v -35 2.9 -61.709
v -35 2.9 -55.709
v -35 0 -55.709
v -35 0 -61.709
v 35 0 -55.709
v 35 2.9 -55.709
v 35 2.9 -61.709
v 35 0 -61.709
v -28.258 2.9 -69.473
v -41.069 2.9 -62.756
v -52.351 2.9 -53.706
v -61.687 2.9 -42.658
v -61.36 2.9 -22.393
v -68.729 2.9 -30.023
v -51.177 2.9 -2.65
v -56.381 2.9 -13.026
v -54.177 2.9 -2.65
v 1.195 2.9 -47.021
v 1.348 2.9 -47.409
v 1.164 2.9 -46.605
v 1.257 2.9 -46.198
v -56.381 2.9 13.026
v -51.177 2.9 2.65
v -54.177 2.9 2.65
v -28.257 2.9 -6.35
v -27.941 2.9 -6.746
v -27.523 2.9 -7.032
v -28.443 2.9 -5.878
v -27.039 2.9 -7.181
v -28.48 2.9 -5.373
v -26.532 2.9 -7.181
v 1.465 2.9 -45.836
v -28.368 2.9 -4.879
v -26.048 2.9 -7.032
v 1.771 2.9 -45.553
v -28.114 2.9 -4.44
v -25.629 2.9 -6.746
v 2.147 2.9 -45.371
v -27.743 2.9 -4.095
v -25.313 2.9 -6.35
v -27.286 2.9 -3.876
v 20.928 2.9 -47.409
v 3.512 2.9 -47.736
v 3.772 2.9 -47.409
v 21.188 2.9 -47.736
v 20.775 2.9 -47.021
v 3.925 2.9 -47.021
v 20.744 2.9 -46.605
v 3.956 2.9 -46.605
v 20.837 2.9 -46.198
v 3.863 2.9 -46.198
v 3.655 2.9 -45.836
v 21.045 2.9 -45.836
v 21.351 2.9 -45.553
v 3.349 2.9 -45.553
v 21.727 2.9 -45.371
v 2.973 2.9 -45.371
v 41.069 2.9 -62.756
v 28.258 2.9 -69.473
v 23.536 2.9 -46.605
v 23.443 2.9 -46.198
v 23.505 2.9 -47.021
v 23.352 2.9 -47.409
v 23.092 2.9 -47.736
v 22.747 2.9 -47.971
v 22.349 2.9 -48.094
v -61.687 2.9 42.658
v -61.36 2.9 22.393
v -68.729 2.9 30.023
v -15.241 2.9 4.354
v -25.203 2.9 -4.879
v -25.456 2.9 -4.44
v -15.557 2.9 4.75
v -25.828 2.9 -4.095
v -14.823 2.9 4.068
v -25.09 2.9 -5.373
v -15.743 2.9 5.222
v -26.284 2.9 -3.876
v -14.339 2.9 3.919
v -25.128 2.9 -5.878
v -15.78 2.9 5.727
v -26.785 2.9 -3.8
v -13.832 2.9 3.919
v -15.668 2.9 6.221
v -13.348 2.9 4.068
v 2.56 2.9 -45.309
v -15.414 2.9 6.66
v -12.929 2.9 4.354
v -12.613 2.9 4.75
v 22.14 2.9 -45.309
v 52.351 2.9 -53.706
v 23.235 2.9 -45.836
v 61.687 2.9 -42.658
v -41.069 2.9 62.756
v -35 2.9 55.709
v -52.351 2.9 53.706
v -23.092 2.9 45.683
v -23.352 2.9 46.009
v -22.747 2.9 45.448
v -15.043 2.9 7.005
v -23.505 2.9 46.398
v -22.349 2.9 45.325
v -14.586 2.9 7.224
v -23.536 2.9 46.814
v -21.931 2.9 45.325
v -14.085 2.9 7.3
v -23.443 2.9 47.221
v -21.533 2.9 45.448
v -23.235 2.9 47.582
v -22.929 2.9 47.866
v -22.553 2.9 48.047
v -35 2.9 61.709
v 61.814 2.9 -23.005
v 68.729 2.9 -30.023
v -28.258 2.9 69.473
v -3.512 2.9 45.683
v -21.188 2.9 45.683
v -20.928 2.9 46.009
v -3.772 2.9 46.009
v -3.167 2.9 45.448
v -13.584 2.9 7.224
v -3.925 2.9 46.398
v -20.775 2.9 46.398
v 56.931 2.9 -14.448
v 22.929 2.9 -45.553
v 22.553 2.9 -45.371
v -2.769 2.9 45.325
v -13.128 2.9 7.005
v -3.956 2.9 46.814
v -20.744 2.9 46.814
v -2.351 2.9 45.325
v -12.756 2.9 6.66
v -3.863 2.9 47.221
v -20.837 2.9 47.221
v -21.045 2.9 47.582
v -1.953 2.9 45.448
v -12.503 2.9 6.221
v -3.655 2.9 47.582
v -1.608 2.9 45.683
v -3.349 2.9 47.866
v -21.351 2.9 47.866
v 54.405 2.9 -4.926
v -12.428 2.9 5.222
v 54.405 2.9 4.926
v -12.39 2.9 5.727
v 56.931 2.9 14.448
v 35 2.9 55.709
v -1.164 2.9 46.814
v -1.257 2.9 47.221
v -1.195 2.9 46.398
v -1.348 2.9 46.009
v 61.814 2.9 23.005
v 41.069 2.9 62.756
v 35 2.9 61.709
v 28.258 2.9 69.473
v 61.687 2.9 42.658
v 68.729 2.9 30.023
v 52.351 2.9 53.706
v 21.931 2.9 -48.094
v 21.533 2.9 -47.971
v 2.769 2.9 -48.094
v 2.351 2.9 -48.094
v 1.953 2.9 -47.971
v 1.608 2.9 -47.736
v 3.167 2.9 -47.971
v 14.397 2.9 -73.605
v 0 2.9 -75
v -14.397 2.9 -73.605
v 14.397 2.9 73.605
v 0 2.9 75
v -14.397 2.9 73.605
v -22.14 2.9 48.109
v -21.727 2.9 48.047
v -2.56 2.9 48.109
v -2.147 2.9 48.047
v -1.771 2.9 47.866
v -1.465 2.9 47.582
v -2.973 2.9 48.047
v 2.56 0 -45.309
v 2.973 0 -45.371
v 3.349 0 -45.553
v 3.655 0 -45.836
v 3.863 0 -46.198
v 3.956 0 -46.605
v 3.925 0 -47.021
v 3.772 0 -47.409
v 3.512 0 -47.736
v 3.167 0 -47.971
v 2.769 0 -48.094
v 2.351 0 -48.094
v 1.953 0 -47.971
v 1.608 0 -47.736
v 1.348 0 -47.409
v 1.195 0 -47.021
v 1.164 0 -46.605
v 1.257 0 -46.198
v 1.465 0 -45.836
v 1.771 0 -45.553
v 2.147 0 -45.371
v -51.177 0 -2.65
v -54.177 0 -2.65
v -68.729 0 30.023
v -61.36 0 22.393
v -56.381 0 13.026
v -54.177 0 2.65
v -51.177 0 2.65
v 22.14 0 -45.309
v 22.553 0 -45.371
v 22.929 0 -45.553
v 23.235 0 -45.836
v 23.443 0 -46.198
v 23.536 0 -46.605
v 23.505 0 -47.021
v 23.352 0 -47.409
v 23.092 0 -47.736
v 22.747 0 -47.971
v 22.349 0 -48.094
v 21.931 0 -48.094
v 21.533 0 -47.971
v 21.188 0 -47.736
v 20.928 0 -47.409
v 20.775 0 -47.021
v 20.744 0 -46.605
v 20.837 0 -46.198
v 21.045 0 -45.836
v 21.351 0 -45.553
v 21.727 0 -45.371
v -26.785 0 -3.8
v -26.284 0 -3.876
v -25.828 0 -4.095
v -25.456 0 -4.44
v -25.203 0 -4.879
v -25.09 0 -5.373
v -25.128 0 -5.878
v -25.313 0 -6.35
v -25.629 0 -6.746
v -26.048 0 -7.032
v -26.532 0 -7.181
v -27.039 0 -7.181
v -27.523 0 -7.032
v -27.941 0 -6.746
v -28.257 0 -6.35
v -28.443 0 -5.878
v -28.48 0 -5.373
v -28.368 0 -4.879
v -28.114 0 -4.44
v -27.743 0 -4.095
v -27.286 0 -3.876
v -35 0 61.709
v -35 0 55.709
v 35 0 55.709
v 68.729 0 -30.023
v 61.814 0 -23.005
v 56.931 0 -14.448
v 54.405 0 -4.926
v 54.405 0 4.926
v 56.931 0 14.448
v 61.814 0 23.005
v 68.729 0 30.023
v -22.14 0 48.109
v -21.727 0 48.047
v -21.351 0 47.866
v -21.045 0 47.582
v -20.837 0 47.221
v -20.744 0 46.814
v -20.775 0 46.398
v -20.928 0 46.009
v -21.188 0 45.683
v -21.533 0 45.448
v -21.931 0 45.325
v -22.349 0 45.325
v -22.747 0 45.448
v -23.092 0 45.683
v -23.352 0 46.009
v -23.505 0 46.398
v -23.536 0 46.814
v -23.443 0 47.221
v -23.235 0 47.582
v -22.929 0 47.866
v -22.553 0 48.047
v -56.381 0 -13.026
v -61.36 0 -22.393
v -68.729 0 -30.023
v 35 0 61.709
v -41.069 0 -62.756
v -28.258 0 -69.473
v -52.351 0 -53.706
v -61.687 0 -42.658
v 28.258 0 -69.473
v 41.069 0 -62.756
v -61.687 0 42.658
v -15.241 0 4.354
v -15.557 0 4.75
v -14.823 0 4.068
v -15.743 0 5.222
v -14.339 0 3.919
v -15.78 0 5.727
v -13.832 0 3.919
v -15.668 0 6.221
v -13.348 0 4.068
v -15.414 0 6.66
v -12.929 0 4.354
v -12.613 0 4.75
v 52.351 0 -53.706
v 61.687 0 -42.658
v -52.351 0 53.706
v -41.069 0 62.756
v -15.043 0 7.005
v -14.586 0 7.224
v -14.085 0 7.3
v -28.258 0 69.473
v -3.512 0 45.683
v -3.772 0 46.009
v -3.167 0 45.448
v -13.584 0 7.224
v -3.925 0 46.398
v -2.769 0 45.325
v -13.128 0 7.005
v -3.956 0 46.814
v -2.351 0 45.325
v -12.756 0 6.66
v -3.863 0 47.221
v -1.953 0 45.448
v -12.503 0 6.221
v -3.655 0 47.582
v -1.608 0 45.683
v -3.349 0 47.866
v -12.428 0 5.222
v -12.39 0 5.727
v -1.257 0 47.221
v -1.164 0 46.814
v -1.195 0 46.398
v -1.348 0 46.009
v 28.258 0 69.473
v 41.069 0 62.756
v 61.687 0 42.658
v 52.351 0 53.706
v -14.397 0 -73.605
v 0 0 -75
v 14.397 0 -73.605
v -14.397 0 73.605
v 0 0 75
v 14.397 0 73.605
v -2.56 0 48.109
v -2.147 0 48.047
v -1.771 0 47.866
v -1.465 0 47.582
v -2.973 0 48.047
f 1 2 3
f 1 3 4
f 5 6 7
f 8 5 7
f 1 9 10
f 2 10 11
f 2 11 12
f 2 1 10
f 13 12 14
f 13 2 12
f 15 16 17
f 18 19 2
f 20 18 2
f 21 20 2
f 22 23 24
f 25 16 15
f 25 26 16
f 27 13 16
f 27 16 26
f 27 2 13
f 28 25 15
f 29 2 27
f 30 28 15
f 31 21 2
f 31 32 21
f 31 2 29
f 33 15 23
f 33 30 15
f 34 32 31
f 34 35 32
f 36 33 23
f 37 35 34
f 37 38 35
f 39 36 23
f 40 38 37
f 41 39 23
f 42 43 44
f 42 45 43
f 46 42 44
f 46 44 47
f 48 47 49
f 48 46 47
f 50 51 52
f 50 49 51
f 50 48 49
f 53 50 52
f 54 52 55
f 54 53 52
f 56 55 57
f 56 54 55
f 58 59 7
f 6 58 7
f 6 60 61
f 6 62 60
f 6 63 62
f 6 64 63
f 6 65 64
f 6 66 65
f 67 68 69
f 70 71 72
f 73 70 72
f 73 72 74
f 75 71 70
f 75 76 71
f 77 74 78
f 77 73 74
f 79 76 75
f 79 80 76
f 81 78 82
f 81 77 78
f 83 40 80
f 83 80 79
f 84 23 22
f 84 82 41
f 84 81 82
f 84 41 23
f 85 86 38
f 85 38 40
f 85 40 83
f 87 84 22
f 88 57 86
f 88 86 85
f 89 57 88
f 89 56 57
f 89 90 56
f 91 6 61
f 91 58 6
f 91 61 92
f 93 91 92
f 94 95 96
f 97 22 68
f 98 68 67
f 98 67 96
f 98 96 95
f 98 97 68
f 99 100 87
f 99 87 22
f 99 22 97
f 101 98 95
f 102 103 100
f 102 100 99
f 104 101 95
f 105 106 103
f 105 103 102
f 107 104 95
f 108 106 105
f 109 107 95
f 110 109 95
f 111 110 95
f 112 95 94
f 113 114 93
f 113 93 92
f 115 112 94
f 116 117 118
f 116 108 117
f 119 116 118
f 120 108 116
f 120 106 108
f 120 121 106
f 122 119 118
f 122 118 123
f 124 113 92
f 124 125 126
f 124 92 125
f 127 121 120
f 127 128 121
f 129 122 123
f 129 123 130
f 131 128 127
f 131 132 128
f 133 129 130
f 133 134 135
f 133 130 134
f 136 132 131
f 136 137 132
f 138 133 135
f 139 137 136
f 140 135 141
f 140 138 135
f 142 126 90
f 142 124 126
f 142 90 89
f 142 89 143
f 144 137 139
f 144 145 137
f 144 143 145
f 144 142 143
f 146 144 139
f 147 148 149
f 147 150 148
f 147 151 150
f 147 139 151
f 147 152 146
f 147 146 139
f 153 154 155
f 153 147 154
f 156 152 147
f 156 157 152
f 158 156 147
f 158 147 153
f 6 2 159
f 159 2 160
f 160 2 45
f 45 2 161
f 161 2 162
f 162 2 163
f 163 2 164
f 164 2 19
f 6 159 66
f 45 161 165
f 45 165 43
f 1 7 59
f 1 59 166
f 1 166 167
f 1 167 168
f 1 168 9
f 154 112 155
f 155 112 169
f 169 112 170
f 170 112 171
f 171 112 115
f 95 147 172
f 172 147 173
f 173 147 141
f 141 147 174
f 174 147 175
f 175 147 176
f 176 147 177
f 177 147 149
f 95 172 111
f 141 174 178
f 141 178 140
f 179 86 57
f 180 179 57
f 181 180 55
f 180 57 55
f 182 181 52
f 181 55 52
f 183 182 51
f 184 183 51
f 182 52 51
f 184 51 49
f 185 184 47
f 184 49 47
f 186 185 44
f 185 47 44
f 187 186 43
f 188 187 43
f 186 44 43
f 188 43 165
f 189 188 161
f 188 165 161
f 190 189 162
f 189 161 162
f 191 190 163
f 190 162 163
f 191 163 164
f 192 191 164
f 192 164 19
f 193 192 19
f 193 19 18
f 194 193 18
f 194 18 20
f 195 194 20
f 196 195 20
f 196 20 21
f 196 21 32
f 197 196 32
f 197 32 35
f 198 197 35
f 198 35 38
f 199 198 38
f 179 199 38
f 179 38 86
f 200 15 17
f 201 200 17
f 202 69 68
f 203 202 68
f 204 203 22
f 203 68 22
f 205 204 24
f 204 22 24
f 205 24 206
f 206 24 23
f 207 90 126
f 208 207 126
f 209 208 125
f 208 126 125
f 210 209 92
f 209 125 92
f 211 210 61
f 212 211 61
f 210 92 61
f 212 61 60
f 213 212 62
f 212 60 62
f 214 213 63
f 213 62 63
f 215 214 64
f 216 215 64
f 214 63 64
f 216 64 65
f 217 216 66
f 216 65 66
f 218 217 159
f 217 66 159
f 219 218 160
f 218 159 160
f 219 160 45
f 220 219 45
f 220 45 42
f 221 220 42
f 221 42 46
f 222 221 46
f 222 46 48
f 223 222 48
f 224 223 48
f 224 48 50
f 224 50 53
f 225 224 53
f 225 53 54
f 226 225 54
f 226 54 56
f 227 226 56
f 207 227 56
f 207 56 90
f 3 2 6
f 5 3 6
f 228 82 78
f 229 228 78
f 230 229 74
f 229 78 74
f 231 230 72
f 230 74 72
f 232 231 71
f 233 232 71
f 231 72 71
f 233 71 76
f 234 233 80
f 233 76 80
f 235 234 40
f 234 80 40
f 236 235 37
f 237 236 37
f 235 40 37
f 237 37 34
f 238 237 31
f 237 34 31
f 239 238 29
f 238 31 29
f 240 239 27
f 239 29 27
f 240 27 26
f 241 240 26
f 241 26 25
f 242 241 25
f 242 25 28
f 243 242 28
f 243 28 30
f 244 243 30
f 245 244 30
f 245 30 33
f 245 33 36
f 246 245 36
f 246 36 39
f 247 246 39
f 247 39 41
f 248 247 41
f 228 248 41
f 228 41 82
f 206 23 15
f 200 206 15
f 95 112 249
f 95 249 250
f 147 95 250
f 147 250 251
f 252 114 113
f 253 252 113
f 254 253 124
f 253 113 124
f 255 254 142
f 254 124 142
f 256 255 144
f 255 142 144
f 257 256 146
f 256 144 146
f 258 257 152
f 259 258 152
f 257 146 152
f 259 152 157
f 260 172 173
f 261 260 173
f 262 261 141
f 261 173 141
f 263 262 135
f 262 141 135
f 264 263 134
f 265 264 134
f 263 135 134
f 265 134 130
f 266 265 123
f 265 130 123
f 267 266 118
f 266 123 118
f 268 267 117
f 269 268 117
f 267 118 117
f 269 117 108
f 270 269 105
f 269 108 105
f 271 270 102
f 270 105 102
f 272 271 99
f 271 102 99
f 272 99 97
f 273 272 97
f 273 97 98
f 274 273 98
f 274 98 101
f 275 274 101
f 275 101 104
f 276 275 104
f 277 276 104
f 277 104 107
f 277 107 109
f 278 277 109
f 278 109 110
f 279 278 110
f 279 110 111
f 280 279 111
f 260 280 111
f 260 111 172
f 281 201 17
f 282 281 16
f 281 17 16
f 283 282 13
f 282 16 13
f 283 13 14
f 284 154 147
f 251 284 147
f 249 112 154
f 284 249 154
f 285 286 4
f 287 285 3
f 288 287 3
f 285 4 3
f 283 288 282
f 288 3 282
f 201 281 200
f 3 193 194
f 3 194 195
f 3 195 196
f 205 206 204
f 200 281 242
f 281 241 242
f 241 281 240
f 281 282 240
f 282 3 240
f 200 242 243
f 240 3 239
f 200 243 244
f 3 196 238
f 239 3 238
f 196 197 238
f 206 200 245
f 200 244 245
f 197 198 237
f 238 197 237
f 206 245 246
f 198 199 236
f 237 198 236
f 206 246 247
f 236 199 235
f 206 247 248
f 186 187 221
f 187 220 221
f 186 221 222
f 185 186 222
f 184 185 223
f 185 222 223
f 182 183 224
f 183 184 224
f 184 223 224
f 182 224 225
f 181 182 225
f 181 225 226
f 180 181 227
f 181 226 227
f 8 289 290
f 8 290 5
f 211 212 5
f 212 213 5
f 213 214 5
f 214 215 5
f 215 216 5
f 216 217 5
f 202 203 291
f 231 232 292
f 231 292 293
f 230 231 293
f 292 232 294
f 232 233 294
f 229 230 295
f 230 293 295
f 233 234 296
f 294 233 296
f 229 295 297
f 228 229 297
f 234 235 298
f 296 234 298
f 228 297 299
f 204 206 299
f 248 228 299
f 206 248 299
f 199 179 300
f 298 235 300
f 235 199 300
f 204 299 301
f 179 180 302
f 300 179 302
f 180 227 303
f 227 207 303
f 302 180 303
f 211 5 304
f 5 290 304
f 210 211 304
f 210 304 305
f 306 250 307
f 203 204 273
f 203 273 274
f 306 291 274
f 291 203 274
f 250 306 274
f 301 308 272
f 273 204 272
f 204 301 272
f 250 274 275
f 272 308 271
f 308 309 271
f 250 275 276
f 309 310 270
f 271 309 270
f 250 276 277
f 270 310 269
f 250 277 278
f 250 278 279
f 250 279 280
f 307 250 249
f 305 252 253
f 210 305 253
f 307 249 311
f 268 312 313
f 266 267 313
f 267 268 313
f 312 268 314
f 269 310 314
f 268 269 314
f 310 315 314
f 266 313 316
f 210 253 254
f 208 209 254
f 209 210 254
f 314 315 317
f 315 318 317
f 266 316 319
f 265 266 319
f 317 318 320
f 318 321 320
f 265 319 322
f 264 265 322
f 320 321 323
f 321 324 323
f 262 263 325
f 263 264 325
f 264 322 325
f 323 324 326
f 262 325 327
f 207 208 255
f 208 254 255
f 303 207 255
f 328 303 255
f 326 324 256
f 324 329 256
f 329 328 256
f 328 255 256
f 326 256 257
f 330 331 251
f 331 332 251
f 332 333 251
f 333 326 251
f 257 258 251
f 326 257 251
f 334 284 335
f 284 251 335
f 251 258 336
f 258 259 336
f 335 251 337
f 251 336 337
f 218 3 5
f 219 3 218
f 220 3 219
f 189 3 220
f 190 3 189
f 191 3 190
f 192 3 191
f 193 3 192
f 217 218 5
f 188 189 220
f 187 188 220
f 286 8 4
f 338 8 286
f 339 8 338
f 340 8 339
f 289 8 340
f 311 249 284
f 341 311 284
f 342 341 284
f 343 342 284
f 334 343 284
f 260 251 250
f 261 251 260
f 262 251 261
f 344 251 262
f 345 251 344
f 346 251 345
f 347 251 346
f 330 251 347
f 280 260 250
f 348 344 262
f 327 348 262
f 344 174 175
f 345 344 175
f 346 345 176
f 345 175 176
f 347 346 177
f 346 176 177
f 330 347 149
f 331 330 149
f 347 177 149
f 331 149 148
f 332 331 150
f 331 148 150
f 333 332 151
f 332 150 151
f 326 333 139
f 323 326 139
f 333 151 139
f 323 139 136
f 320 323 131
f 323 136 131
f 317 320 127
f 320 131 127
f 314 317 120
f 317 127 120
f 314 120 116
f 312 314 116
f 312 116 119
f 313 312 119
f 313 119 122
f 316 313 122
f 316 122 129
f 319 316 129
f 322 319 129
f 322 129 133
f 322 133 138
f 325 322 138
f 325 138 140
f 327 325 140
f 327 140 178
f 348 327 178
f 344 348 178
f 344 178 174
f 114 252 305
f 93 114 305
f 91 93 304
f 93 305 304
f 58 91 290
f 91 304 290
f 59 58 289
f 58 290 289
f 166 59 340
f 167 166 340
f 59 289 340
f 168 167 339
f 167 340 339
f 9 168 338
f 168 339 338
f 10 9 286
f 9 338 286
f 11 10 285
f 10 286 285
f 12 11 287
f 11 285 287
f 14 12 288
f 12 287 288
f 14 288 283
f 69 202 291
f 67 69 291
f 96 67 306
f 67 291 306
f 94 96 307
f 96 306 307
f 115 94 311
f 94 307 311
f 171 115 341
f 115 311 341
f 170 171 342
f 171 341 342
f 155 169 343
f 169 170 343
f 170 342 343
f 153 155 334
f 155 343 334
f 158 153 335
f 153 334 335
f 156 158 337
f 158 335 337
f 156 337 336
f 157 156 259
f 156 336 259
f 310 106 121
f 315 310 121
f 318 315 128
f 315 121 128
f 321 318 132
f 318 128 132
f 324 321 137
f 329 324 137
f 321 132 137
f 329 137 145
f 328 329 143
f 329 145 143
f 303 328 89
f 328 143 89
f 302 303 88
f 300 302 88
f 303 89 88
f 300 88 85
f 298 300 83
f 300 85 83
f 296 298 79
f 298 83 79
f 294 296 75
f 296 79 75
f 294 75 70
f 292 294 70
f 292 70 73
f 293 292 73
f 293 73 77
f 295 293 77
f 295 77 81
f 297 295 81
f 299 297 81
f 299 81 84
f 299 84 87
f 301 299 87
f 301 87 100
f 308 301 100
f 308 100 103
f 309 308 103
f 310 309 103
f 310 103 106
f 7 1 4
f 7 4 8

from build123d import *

# Parameters (mm, degrees)
SKETCH1_R           = 75
BOSS_EXTRUDE1_DEPTH = 2.9
SKETCH2_W           = 70
SKETCH2_H           = 6
SKETCH2_R           = 1.4
CUT_EXTRUDE1_DEPTH  = 10
SKETCH3_R           = 1.7
CUT_EXTRUDE3_DEPTH  = 10


with BuildPart() as part:
    # Sketch1 → Boss-Extrude1 (new body)
    with BuildSketch(Plane(origin=(0, 0, 0), x_dir=(1, 0, 0), z_dir=(0, 1, 0))):
        with Locations(Location((0, 0, 0), (0, 0, 270))):
            Circle(SKETCH1_R)
    extrude(amount=BOSS_EXTRUDE1_DEPTH)

    # Sketch2 → Cut-Extrude1 (cut)
    with BuildSketch(Plane(origin=(0, 2.9, 0), x_dir=(1, 0, 0), z_dir=(0, 1, 0))):
        with Locations((0, -58.709242105)):
            Rectangle(SKETCH2_W, SKETCH2_H)
        with Locations((0, 58.709242105)):
            Rectangle(SKETCH2_W, SKETCH2_H)
        with BuildLine():
            ThreePointArc((-68.72850121, -30.023209712), (-54.08520342, 0), (-68.72850121, 30.023209712))
            ThreePointArc((-68.72850121, 30.023209712), (-75, 0), (-68.72850121, -30.023209712))
        make_face()
        with BuildLine():
            ThreePointArc((68.72850121, -30.023209712), (75, 0), (68.72850121, 30.023209712))
            ThreePointArc((68.72850121, 30.023209712), (54.08520342, 0), (68.72850121, -30.023209712))
        make_face()
        with Locations(Location((-22.14, -46.709242105, 0), (0, 0, 270))):
            Circle(SKETCH2_R)
        with Locations(Location((-2.56, -46.709242105, 0), (0, 0, 270))):
            Circle(SKETCH2_R)
        with Locations(Location((22.14, 46.709242105, 0), (0, 0, 270))):
            Circle(SKETCH2_R)
        with Locations(Location((2.56, 46.709242105, 0), (0, 0, 270))):
            Circle(SKETCH2_R)
    extrude(amount=-CUT_EXTRUDE1_DEPTH, mode=Mode.SUBTRACT)

    # Sketch3 → Cut-Extrude3 (cut)
    with BuildSketch(Plane(origin=(0, 2.9, 0), x_dir=(1, 0, 0), z_dir=(0, 1, 0))):
        with Locations(Location((-26.78520342, 5.5, 0), (0, 0, 270))):
            Circle(SKETCH3_R)
        with Locations(Location((-14.08520342, -5.6, 0), (0, 0, 270))):
            Circle(SKETCH3_R)
        with BuildLine():
            Line((-51.177473943, 2.65), (-54.177473943, 2.65))
            ThreePointArc((-54.177473943, 2.65), (-54.08520342, 0), (-54.177473943, -2.65))
            Line((-54.177473943, -2.65), (-51.177473943, -2.65))
            Line((-51.177473943, -2.65), (-51.177473943, 2.65))
        make_face()
    extrude(amount=-CUT_EXTRUDE3_DEPTH, mode=Mode.SUBTRACT)


solid = part.part
